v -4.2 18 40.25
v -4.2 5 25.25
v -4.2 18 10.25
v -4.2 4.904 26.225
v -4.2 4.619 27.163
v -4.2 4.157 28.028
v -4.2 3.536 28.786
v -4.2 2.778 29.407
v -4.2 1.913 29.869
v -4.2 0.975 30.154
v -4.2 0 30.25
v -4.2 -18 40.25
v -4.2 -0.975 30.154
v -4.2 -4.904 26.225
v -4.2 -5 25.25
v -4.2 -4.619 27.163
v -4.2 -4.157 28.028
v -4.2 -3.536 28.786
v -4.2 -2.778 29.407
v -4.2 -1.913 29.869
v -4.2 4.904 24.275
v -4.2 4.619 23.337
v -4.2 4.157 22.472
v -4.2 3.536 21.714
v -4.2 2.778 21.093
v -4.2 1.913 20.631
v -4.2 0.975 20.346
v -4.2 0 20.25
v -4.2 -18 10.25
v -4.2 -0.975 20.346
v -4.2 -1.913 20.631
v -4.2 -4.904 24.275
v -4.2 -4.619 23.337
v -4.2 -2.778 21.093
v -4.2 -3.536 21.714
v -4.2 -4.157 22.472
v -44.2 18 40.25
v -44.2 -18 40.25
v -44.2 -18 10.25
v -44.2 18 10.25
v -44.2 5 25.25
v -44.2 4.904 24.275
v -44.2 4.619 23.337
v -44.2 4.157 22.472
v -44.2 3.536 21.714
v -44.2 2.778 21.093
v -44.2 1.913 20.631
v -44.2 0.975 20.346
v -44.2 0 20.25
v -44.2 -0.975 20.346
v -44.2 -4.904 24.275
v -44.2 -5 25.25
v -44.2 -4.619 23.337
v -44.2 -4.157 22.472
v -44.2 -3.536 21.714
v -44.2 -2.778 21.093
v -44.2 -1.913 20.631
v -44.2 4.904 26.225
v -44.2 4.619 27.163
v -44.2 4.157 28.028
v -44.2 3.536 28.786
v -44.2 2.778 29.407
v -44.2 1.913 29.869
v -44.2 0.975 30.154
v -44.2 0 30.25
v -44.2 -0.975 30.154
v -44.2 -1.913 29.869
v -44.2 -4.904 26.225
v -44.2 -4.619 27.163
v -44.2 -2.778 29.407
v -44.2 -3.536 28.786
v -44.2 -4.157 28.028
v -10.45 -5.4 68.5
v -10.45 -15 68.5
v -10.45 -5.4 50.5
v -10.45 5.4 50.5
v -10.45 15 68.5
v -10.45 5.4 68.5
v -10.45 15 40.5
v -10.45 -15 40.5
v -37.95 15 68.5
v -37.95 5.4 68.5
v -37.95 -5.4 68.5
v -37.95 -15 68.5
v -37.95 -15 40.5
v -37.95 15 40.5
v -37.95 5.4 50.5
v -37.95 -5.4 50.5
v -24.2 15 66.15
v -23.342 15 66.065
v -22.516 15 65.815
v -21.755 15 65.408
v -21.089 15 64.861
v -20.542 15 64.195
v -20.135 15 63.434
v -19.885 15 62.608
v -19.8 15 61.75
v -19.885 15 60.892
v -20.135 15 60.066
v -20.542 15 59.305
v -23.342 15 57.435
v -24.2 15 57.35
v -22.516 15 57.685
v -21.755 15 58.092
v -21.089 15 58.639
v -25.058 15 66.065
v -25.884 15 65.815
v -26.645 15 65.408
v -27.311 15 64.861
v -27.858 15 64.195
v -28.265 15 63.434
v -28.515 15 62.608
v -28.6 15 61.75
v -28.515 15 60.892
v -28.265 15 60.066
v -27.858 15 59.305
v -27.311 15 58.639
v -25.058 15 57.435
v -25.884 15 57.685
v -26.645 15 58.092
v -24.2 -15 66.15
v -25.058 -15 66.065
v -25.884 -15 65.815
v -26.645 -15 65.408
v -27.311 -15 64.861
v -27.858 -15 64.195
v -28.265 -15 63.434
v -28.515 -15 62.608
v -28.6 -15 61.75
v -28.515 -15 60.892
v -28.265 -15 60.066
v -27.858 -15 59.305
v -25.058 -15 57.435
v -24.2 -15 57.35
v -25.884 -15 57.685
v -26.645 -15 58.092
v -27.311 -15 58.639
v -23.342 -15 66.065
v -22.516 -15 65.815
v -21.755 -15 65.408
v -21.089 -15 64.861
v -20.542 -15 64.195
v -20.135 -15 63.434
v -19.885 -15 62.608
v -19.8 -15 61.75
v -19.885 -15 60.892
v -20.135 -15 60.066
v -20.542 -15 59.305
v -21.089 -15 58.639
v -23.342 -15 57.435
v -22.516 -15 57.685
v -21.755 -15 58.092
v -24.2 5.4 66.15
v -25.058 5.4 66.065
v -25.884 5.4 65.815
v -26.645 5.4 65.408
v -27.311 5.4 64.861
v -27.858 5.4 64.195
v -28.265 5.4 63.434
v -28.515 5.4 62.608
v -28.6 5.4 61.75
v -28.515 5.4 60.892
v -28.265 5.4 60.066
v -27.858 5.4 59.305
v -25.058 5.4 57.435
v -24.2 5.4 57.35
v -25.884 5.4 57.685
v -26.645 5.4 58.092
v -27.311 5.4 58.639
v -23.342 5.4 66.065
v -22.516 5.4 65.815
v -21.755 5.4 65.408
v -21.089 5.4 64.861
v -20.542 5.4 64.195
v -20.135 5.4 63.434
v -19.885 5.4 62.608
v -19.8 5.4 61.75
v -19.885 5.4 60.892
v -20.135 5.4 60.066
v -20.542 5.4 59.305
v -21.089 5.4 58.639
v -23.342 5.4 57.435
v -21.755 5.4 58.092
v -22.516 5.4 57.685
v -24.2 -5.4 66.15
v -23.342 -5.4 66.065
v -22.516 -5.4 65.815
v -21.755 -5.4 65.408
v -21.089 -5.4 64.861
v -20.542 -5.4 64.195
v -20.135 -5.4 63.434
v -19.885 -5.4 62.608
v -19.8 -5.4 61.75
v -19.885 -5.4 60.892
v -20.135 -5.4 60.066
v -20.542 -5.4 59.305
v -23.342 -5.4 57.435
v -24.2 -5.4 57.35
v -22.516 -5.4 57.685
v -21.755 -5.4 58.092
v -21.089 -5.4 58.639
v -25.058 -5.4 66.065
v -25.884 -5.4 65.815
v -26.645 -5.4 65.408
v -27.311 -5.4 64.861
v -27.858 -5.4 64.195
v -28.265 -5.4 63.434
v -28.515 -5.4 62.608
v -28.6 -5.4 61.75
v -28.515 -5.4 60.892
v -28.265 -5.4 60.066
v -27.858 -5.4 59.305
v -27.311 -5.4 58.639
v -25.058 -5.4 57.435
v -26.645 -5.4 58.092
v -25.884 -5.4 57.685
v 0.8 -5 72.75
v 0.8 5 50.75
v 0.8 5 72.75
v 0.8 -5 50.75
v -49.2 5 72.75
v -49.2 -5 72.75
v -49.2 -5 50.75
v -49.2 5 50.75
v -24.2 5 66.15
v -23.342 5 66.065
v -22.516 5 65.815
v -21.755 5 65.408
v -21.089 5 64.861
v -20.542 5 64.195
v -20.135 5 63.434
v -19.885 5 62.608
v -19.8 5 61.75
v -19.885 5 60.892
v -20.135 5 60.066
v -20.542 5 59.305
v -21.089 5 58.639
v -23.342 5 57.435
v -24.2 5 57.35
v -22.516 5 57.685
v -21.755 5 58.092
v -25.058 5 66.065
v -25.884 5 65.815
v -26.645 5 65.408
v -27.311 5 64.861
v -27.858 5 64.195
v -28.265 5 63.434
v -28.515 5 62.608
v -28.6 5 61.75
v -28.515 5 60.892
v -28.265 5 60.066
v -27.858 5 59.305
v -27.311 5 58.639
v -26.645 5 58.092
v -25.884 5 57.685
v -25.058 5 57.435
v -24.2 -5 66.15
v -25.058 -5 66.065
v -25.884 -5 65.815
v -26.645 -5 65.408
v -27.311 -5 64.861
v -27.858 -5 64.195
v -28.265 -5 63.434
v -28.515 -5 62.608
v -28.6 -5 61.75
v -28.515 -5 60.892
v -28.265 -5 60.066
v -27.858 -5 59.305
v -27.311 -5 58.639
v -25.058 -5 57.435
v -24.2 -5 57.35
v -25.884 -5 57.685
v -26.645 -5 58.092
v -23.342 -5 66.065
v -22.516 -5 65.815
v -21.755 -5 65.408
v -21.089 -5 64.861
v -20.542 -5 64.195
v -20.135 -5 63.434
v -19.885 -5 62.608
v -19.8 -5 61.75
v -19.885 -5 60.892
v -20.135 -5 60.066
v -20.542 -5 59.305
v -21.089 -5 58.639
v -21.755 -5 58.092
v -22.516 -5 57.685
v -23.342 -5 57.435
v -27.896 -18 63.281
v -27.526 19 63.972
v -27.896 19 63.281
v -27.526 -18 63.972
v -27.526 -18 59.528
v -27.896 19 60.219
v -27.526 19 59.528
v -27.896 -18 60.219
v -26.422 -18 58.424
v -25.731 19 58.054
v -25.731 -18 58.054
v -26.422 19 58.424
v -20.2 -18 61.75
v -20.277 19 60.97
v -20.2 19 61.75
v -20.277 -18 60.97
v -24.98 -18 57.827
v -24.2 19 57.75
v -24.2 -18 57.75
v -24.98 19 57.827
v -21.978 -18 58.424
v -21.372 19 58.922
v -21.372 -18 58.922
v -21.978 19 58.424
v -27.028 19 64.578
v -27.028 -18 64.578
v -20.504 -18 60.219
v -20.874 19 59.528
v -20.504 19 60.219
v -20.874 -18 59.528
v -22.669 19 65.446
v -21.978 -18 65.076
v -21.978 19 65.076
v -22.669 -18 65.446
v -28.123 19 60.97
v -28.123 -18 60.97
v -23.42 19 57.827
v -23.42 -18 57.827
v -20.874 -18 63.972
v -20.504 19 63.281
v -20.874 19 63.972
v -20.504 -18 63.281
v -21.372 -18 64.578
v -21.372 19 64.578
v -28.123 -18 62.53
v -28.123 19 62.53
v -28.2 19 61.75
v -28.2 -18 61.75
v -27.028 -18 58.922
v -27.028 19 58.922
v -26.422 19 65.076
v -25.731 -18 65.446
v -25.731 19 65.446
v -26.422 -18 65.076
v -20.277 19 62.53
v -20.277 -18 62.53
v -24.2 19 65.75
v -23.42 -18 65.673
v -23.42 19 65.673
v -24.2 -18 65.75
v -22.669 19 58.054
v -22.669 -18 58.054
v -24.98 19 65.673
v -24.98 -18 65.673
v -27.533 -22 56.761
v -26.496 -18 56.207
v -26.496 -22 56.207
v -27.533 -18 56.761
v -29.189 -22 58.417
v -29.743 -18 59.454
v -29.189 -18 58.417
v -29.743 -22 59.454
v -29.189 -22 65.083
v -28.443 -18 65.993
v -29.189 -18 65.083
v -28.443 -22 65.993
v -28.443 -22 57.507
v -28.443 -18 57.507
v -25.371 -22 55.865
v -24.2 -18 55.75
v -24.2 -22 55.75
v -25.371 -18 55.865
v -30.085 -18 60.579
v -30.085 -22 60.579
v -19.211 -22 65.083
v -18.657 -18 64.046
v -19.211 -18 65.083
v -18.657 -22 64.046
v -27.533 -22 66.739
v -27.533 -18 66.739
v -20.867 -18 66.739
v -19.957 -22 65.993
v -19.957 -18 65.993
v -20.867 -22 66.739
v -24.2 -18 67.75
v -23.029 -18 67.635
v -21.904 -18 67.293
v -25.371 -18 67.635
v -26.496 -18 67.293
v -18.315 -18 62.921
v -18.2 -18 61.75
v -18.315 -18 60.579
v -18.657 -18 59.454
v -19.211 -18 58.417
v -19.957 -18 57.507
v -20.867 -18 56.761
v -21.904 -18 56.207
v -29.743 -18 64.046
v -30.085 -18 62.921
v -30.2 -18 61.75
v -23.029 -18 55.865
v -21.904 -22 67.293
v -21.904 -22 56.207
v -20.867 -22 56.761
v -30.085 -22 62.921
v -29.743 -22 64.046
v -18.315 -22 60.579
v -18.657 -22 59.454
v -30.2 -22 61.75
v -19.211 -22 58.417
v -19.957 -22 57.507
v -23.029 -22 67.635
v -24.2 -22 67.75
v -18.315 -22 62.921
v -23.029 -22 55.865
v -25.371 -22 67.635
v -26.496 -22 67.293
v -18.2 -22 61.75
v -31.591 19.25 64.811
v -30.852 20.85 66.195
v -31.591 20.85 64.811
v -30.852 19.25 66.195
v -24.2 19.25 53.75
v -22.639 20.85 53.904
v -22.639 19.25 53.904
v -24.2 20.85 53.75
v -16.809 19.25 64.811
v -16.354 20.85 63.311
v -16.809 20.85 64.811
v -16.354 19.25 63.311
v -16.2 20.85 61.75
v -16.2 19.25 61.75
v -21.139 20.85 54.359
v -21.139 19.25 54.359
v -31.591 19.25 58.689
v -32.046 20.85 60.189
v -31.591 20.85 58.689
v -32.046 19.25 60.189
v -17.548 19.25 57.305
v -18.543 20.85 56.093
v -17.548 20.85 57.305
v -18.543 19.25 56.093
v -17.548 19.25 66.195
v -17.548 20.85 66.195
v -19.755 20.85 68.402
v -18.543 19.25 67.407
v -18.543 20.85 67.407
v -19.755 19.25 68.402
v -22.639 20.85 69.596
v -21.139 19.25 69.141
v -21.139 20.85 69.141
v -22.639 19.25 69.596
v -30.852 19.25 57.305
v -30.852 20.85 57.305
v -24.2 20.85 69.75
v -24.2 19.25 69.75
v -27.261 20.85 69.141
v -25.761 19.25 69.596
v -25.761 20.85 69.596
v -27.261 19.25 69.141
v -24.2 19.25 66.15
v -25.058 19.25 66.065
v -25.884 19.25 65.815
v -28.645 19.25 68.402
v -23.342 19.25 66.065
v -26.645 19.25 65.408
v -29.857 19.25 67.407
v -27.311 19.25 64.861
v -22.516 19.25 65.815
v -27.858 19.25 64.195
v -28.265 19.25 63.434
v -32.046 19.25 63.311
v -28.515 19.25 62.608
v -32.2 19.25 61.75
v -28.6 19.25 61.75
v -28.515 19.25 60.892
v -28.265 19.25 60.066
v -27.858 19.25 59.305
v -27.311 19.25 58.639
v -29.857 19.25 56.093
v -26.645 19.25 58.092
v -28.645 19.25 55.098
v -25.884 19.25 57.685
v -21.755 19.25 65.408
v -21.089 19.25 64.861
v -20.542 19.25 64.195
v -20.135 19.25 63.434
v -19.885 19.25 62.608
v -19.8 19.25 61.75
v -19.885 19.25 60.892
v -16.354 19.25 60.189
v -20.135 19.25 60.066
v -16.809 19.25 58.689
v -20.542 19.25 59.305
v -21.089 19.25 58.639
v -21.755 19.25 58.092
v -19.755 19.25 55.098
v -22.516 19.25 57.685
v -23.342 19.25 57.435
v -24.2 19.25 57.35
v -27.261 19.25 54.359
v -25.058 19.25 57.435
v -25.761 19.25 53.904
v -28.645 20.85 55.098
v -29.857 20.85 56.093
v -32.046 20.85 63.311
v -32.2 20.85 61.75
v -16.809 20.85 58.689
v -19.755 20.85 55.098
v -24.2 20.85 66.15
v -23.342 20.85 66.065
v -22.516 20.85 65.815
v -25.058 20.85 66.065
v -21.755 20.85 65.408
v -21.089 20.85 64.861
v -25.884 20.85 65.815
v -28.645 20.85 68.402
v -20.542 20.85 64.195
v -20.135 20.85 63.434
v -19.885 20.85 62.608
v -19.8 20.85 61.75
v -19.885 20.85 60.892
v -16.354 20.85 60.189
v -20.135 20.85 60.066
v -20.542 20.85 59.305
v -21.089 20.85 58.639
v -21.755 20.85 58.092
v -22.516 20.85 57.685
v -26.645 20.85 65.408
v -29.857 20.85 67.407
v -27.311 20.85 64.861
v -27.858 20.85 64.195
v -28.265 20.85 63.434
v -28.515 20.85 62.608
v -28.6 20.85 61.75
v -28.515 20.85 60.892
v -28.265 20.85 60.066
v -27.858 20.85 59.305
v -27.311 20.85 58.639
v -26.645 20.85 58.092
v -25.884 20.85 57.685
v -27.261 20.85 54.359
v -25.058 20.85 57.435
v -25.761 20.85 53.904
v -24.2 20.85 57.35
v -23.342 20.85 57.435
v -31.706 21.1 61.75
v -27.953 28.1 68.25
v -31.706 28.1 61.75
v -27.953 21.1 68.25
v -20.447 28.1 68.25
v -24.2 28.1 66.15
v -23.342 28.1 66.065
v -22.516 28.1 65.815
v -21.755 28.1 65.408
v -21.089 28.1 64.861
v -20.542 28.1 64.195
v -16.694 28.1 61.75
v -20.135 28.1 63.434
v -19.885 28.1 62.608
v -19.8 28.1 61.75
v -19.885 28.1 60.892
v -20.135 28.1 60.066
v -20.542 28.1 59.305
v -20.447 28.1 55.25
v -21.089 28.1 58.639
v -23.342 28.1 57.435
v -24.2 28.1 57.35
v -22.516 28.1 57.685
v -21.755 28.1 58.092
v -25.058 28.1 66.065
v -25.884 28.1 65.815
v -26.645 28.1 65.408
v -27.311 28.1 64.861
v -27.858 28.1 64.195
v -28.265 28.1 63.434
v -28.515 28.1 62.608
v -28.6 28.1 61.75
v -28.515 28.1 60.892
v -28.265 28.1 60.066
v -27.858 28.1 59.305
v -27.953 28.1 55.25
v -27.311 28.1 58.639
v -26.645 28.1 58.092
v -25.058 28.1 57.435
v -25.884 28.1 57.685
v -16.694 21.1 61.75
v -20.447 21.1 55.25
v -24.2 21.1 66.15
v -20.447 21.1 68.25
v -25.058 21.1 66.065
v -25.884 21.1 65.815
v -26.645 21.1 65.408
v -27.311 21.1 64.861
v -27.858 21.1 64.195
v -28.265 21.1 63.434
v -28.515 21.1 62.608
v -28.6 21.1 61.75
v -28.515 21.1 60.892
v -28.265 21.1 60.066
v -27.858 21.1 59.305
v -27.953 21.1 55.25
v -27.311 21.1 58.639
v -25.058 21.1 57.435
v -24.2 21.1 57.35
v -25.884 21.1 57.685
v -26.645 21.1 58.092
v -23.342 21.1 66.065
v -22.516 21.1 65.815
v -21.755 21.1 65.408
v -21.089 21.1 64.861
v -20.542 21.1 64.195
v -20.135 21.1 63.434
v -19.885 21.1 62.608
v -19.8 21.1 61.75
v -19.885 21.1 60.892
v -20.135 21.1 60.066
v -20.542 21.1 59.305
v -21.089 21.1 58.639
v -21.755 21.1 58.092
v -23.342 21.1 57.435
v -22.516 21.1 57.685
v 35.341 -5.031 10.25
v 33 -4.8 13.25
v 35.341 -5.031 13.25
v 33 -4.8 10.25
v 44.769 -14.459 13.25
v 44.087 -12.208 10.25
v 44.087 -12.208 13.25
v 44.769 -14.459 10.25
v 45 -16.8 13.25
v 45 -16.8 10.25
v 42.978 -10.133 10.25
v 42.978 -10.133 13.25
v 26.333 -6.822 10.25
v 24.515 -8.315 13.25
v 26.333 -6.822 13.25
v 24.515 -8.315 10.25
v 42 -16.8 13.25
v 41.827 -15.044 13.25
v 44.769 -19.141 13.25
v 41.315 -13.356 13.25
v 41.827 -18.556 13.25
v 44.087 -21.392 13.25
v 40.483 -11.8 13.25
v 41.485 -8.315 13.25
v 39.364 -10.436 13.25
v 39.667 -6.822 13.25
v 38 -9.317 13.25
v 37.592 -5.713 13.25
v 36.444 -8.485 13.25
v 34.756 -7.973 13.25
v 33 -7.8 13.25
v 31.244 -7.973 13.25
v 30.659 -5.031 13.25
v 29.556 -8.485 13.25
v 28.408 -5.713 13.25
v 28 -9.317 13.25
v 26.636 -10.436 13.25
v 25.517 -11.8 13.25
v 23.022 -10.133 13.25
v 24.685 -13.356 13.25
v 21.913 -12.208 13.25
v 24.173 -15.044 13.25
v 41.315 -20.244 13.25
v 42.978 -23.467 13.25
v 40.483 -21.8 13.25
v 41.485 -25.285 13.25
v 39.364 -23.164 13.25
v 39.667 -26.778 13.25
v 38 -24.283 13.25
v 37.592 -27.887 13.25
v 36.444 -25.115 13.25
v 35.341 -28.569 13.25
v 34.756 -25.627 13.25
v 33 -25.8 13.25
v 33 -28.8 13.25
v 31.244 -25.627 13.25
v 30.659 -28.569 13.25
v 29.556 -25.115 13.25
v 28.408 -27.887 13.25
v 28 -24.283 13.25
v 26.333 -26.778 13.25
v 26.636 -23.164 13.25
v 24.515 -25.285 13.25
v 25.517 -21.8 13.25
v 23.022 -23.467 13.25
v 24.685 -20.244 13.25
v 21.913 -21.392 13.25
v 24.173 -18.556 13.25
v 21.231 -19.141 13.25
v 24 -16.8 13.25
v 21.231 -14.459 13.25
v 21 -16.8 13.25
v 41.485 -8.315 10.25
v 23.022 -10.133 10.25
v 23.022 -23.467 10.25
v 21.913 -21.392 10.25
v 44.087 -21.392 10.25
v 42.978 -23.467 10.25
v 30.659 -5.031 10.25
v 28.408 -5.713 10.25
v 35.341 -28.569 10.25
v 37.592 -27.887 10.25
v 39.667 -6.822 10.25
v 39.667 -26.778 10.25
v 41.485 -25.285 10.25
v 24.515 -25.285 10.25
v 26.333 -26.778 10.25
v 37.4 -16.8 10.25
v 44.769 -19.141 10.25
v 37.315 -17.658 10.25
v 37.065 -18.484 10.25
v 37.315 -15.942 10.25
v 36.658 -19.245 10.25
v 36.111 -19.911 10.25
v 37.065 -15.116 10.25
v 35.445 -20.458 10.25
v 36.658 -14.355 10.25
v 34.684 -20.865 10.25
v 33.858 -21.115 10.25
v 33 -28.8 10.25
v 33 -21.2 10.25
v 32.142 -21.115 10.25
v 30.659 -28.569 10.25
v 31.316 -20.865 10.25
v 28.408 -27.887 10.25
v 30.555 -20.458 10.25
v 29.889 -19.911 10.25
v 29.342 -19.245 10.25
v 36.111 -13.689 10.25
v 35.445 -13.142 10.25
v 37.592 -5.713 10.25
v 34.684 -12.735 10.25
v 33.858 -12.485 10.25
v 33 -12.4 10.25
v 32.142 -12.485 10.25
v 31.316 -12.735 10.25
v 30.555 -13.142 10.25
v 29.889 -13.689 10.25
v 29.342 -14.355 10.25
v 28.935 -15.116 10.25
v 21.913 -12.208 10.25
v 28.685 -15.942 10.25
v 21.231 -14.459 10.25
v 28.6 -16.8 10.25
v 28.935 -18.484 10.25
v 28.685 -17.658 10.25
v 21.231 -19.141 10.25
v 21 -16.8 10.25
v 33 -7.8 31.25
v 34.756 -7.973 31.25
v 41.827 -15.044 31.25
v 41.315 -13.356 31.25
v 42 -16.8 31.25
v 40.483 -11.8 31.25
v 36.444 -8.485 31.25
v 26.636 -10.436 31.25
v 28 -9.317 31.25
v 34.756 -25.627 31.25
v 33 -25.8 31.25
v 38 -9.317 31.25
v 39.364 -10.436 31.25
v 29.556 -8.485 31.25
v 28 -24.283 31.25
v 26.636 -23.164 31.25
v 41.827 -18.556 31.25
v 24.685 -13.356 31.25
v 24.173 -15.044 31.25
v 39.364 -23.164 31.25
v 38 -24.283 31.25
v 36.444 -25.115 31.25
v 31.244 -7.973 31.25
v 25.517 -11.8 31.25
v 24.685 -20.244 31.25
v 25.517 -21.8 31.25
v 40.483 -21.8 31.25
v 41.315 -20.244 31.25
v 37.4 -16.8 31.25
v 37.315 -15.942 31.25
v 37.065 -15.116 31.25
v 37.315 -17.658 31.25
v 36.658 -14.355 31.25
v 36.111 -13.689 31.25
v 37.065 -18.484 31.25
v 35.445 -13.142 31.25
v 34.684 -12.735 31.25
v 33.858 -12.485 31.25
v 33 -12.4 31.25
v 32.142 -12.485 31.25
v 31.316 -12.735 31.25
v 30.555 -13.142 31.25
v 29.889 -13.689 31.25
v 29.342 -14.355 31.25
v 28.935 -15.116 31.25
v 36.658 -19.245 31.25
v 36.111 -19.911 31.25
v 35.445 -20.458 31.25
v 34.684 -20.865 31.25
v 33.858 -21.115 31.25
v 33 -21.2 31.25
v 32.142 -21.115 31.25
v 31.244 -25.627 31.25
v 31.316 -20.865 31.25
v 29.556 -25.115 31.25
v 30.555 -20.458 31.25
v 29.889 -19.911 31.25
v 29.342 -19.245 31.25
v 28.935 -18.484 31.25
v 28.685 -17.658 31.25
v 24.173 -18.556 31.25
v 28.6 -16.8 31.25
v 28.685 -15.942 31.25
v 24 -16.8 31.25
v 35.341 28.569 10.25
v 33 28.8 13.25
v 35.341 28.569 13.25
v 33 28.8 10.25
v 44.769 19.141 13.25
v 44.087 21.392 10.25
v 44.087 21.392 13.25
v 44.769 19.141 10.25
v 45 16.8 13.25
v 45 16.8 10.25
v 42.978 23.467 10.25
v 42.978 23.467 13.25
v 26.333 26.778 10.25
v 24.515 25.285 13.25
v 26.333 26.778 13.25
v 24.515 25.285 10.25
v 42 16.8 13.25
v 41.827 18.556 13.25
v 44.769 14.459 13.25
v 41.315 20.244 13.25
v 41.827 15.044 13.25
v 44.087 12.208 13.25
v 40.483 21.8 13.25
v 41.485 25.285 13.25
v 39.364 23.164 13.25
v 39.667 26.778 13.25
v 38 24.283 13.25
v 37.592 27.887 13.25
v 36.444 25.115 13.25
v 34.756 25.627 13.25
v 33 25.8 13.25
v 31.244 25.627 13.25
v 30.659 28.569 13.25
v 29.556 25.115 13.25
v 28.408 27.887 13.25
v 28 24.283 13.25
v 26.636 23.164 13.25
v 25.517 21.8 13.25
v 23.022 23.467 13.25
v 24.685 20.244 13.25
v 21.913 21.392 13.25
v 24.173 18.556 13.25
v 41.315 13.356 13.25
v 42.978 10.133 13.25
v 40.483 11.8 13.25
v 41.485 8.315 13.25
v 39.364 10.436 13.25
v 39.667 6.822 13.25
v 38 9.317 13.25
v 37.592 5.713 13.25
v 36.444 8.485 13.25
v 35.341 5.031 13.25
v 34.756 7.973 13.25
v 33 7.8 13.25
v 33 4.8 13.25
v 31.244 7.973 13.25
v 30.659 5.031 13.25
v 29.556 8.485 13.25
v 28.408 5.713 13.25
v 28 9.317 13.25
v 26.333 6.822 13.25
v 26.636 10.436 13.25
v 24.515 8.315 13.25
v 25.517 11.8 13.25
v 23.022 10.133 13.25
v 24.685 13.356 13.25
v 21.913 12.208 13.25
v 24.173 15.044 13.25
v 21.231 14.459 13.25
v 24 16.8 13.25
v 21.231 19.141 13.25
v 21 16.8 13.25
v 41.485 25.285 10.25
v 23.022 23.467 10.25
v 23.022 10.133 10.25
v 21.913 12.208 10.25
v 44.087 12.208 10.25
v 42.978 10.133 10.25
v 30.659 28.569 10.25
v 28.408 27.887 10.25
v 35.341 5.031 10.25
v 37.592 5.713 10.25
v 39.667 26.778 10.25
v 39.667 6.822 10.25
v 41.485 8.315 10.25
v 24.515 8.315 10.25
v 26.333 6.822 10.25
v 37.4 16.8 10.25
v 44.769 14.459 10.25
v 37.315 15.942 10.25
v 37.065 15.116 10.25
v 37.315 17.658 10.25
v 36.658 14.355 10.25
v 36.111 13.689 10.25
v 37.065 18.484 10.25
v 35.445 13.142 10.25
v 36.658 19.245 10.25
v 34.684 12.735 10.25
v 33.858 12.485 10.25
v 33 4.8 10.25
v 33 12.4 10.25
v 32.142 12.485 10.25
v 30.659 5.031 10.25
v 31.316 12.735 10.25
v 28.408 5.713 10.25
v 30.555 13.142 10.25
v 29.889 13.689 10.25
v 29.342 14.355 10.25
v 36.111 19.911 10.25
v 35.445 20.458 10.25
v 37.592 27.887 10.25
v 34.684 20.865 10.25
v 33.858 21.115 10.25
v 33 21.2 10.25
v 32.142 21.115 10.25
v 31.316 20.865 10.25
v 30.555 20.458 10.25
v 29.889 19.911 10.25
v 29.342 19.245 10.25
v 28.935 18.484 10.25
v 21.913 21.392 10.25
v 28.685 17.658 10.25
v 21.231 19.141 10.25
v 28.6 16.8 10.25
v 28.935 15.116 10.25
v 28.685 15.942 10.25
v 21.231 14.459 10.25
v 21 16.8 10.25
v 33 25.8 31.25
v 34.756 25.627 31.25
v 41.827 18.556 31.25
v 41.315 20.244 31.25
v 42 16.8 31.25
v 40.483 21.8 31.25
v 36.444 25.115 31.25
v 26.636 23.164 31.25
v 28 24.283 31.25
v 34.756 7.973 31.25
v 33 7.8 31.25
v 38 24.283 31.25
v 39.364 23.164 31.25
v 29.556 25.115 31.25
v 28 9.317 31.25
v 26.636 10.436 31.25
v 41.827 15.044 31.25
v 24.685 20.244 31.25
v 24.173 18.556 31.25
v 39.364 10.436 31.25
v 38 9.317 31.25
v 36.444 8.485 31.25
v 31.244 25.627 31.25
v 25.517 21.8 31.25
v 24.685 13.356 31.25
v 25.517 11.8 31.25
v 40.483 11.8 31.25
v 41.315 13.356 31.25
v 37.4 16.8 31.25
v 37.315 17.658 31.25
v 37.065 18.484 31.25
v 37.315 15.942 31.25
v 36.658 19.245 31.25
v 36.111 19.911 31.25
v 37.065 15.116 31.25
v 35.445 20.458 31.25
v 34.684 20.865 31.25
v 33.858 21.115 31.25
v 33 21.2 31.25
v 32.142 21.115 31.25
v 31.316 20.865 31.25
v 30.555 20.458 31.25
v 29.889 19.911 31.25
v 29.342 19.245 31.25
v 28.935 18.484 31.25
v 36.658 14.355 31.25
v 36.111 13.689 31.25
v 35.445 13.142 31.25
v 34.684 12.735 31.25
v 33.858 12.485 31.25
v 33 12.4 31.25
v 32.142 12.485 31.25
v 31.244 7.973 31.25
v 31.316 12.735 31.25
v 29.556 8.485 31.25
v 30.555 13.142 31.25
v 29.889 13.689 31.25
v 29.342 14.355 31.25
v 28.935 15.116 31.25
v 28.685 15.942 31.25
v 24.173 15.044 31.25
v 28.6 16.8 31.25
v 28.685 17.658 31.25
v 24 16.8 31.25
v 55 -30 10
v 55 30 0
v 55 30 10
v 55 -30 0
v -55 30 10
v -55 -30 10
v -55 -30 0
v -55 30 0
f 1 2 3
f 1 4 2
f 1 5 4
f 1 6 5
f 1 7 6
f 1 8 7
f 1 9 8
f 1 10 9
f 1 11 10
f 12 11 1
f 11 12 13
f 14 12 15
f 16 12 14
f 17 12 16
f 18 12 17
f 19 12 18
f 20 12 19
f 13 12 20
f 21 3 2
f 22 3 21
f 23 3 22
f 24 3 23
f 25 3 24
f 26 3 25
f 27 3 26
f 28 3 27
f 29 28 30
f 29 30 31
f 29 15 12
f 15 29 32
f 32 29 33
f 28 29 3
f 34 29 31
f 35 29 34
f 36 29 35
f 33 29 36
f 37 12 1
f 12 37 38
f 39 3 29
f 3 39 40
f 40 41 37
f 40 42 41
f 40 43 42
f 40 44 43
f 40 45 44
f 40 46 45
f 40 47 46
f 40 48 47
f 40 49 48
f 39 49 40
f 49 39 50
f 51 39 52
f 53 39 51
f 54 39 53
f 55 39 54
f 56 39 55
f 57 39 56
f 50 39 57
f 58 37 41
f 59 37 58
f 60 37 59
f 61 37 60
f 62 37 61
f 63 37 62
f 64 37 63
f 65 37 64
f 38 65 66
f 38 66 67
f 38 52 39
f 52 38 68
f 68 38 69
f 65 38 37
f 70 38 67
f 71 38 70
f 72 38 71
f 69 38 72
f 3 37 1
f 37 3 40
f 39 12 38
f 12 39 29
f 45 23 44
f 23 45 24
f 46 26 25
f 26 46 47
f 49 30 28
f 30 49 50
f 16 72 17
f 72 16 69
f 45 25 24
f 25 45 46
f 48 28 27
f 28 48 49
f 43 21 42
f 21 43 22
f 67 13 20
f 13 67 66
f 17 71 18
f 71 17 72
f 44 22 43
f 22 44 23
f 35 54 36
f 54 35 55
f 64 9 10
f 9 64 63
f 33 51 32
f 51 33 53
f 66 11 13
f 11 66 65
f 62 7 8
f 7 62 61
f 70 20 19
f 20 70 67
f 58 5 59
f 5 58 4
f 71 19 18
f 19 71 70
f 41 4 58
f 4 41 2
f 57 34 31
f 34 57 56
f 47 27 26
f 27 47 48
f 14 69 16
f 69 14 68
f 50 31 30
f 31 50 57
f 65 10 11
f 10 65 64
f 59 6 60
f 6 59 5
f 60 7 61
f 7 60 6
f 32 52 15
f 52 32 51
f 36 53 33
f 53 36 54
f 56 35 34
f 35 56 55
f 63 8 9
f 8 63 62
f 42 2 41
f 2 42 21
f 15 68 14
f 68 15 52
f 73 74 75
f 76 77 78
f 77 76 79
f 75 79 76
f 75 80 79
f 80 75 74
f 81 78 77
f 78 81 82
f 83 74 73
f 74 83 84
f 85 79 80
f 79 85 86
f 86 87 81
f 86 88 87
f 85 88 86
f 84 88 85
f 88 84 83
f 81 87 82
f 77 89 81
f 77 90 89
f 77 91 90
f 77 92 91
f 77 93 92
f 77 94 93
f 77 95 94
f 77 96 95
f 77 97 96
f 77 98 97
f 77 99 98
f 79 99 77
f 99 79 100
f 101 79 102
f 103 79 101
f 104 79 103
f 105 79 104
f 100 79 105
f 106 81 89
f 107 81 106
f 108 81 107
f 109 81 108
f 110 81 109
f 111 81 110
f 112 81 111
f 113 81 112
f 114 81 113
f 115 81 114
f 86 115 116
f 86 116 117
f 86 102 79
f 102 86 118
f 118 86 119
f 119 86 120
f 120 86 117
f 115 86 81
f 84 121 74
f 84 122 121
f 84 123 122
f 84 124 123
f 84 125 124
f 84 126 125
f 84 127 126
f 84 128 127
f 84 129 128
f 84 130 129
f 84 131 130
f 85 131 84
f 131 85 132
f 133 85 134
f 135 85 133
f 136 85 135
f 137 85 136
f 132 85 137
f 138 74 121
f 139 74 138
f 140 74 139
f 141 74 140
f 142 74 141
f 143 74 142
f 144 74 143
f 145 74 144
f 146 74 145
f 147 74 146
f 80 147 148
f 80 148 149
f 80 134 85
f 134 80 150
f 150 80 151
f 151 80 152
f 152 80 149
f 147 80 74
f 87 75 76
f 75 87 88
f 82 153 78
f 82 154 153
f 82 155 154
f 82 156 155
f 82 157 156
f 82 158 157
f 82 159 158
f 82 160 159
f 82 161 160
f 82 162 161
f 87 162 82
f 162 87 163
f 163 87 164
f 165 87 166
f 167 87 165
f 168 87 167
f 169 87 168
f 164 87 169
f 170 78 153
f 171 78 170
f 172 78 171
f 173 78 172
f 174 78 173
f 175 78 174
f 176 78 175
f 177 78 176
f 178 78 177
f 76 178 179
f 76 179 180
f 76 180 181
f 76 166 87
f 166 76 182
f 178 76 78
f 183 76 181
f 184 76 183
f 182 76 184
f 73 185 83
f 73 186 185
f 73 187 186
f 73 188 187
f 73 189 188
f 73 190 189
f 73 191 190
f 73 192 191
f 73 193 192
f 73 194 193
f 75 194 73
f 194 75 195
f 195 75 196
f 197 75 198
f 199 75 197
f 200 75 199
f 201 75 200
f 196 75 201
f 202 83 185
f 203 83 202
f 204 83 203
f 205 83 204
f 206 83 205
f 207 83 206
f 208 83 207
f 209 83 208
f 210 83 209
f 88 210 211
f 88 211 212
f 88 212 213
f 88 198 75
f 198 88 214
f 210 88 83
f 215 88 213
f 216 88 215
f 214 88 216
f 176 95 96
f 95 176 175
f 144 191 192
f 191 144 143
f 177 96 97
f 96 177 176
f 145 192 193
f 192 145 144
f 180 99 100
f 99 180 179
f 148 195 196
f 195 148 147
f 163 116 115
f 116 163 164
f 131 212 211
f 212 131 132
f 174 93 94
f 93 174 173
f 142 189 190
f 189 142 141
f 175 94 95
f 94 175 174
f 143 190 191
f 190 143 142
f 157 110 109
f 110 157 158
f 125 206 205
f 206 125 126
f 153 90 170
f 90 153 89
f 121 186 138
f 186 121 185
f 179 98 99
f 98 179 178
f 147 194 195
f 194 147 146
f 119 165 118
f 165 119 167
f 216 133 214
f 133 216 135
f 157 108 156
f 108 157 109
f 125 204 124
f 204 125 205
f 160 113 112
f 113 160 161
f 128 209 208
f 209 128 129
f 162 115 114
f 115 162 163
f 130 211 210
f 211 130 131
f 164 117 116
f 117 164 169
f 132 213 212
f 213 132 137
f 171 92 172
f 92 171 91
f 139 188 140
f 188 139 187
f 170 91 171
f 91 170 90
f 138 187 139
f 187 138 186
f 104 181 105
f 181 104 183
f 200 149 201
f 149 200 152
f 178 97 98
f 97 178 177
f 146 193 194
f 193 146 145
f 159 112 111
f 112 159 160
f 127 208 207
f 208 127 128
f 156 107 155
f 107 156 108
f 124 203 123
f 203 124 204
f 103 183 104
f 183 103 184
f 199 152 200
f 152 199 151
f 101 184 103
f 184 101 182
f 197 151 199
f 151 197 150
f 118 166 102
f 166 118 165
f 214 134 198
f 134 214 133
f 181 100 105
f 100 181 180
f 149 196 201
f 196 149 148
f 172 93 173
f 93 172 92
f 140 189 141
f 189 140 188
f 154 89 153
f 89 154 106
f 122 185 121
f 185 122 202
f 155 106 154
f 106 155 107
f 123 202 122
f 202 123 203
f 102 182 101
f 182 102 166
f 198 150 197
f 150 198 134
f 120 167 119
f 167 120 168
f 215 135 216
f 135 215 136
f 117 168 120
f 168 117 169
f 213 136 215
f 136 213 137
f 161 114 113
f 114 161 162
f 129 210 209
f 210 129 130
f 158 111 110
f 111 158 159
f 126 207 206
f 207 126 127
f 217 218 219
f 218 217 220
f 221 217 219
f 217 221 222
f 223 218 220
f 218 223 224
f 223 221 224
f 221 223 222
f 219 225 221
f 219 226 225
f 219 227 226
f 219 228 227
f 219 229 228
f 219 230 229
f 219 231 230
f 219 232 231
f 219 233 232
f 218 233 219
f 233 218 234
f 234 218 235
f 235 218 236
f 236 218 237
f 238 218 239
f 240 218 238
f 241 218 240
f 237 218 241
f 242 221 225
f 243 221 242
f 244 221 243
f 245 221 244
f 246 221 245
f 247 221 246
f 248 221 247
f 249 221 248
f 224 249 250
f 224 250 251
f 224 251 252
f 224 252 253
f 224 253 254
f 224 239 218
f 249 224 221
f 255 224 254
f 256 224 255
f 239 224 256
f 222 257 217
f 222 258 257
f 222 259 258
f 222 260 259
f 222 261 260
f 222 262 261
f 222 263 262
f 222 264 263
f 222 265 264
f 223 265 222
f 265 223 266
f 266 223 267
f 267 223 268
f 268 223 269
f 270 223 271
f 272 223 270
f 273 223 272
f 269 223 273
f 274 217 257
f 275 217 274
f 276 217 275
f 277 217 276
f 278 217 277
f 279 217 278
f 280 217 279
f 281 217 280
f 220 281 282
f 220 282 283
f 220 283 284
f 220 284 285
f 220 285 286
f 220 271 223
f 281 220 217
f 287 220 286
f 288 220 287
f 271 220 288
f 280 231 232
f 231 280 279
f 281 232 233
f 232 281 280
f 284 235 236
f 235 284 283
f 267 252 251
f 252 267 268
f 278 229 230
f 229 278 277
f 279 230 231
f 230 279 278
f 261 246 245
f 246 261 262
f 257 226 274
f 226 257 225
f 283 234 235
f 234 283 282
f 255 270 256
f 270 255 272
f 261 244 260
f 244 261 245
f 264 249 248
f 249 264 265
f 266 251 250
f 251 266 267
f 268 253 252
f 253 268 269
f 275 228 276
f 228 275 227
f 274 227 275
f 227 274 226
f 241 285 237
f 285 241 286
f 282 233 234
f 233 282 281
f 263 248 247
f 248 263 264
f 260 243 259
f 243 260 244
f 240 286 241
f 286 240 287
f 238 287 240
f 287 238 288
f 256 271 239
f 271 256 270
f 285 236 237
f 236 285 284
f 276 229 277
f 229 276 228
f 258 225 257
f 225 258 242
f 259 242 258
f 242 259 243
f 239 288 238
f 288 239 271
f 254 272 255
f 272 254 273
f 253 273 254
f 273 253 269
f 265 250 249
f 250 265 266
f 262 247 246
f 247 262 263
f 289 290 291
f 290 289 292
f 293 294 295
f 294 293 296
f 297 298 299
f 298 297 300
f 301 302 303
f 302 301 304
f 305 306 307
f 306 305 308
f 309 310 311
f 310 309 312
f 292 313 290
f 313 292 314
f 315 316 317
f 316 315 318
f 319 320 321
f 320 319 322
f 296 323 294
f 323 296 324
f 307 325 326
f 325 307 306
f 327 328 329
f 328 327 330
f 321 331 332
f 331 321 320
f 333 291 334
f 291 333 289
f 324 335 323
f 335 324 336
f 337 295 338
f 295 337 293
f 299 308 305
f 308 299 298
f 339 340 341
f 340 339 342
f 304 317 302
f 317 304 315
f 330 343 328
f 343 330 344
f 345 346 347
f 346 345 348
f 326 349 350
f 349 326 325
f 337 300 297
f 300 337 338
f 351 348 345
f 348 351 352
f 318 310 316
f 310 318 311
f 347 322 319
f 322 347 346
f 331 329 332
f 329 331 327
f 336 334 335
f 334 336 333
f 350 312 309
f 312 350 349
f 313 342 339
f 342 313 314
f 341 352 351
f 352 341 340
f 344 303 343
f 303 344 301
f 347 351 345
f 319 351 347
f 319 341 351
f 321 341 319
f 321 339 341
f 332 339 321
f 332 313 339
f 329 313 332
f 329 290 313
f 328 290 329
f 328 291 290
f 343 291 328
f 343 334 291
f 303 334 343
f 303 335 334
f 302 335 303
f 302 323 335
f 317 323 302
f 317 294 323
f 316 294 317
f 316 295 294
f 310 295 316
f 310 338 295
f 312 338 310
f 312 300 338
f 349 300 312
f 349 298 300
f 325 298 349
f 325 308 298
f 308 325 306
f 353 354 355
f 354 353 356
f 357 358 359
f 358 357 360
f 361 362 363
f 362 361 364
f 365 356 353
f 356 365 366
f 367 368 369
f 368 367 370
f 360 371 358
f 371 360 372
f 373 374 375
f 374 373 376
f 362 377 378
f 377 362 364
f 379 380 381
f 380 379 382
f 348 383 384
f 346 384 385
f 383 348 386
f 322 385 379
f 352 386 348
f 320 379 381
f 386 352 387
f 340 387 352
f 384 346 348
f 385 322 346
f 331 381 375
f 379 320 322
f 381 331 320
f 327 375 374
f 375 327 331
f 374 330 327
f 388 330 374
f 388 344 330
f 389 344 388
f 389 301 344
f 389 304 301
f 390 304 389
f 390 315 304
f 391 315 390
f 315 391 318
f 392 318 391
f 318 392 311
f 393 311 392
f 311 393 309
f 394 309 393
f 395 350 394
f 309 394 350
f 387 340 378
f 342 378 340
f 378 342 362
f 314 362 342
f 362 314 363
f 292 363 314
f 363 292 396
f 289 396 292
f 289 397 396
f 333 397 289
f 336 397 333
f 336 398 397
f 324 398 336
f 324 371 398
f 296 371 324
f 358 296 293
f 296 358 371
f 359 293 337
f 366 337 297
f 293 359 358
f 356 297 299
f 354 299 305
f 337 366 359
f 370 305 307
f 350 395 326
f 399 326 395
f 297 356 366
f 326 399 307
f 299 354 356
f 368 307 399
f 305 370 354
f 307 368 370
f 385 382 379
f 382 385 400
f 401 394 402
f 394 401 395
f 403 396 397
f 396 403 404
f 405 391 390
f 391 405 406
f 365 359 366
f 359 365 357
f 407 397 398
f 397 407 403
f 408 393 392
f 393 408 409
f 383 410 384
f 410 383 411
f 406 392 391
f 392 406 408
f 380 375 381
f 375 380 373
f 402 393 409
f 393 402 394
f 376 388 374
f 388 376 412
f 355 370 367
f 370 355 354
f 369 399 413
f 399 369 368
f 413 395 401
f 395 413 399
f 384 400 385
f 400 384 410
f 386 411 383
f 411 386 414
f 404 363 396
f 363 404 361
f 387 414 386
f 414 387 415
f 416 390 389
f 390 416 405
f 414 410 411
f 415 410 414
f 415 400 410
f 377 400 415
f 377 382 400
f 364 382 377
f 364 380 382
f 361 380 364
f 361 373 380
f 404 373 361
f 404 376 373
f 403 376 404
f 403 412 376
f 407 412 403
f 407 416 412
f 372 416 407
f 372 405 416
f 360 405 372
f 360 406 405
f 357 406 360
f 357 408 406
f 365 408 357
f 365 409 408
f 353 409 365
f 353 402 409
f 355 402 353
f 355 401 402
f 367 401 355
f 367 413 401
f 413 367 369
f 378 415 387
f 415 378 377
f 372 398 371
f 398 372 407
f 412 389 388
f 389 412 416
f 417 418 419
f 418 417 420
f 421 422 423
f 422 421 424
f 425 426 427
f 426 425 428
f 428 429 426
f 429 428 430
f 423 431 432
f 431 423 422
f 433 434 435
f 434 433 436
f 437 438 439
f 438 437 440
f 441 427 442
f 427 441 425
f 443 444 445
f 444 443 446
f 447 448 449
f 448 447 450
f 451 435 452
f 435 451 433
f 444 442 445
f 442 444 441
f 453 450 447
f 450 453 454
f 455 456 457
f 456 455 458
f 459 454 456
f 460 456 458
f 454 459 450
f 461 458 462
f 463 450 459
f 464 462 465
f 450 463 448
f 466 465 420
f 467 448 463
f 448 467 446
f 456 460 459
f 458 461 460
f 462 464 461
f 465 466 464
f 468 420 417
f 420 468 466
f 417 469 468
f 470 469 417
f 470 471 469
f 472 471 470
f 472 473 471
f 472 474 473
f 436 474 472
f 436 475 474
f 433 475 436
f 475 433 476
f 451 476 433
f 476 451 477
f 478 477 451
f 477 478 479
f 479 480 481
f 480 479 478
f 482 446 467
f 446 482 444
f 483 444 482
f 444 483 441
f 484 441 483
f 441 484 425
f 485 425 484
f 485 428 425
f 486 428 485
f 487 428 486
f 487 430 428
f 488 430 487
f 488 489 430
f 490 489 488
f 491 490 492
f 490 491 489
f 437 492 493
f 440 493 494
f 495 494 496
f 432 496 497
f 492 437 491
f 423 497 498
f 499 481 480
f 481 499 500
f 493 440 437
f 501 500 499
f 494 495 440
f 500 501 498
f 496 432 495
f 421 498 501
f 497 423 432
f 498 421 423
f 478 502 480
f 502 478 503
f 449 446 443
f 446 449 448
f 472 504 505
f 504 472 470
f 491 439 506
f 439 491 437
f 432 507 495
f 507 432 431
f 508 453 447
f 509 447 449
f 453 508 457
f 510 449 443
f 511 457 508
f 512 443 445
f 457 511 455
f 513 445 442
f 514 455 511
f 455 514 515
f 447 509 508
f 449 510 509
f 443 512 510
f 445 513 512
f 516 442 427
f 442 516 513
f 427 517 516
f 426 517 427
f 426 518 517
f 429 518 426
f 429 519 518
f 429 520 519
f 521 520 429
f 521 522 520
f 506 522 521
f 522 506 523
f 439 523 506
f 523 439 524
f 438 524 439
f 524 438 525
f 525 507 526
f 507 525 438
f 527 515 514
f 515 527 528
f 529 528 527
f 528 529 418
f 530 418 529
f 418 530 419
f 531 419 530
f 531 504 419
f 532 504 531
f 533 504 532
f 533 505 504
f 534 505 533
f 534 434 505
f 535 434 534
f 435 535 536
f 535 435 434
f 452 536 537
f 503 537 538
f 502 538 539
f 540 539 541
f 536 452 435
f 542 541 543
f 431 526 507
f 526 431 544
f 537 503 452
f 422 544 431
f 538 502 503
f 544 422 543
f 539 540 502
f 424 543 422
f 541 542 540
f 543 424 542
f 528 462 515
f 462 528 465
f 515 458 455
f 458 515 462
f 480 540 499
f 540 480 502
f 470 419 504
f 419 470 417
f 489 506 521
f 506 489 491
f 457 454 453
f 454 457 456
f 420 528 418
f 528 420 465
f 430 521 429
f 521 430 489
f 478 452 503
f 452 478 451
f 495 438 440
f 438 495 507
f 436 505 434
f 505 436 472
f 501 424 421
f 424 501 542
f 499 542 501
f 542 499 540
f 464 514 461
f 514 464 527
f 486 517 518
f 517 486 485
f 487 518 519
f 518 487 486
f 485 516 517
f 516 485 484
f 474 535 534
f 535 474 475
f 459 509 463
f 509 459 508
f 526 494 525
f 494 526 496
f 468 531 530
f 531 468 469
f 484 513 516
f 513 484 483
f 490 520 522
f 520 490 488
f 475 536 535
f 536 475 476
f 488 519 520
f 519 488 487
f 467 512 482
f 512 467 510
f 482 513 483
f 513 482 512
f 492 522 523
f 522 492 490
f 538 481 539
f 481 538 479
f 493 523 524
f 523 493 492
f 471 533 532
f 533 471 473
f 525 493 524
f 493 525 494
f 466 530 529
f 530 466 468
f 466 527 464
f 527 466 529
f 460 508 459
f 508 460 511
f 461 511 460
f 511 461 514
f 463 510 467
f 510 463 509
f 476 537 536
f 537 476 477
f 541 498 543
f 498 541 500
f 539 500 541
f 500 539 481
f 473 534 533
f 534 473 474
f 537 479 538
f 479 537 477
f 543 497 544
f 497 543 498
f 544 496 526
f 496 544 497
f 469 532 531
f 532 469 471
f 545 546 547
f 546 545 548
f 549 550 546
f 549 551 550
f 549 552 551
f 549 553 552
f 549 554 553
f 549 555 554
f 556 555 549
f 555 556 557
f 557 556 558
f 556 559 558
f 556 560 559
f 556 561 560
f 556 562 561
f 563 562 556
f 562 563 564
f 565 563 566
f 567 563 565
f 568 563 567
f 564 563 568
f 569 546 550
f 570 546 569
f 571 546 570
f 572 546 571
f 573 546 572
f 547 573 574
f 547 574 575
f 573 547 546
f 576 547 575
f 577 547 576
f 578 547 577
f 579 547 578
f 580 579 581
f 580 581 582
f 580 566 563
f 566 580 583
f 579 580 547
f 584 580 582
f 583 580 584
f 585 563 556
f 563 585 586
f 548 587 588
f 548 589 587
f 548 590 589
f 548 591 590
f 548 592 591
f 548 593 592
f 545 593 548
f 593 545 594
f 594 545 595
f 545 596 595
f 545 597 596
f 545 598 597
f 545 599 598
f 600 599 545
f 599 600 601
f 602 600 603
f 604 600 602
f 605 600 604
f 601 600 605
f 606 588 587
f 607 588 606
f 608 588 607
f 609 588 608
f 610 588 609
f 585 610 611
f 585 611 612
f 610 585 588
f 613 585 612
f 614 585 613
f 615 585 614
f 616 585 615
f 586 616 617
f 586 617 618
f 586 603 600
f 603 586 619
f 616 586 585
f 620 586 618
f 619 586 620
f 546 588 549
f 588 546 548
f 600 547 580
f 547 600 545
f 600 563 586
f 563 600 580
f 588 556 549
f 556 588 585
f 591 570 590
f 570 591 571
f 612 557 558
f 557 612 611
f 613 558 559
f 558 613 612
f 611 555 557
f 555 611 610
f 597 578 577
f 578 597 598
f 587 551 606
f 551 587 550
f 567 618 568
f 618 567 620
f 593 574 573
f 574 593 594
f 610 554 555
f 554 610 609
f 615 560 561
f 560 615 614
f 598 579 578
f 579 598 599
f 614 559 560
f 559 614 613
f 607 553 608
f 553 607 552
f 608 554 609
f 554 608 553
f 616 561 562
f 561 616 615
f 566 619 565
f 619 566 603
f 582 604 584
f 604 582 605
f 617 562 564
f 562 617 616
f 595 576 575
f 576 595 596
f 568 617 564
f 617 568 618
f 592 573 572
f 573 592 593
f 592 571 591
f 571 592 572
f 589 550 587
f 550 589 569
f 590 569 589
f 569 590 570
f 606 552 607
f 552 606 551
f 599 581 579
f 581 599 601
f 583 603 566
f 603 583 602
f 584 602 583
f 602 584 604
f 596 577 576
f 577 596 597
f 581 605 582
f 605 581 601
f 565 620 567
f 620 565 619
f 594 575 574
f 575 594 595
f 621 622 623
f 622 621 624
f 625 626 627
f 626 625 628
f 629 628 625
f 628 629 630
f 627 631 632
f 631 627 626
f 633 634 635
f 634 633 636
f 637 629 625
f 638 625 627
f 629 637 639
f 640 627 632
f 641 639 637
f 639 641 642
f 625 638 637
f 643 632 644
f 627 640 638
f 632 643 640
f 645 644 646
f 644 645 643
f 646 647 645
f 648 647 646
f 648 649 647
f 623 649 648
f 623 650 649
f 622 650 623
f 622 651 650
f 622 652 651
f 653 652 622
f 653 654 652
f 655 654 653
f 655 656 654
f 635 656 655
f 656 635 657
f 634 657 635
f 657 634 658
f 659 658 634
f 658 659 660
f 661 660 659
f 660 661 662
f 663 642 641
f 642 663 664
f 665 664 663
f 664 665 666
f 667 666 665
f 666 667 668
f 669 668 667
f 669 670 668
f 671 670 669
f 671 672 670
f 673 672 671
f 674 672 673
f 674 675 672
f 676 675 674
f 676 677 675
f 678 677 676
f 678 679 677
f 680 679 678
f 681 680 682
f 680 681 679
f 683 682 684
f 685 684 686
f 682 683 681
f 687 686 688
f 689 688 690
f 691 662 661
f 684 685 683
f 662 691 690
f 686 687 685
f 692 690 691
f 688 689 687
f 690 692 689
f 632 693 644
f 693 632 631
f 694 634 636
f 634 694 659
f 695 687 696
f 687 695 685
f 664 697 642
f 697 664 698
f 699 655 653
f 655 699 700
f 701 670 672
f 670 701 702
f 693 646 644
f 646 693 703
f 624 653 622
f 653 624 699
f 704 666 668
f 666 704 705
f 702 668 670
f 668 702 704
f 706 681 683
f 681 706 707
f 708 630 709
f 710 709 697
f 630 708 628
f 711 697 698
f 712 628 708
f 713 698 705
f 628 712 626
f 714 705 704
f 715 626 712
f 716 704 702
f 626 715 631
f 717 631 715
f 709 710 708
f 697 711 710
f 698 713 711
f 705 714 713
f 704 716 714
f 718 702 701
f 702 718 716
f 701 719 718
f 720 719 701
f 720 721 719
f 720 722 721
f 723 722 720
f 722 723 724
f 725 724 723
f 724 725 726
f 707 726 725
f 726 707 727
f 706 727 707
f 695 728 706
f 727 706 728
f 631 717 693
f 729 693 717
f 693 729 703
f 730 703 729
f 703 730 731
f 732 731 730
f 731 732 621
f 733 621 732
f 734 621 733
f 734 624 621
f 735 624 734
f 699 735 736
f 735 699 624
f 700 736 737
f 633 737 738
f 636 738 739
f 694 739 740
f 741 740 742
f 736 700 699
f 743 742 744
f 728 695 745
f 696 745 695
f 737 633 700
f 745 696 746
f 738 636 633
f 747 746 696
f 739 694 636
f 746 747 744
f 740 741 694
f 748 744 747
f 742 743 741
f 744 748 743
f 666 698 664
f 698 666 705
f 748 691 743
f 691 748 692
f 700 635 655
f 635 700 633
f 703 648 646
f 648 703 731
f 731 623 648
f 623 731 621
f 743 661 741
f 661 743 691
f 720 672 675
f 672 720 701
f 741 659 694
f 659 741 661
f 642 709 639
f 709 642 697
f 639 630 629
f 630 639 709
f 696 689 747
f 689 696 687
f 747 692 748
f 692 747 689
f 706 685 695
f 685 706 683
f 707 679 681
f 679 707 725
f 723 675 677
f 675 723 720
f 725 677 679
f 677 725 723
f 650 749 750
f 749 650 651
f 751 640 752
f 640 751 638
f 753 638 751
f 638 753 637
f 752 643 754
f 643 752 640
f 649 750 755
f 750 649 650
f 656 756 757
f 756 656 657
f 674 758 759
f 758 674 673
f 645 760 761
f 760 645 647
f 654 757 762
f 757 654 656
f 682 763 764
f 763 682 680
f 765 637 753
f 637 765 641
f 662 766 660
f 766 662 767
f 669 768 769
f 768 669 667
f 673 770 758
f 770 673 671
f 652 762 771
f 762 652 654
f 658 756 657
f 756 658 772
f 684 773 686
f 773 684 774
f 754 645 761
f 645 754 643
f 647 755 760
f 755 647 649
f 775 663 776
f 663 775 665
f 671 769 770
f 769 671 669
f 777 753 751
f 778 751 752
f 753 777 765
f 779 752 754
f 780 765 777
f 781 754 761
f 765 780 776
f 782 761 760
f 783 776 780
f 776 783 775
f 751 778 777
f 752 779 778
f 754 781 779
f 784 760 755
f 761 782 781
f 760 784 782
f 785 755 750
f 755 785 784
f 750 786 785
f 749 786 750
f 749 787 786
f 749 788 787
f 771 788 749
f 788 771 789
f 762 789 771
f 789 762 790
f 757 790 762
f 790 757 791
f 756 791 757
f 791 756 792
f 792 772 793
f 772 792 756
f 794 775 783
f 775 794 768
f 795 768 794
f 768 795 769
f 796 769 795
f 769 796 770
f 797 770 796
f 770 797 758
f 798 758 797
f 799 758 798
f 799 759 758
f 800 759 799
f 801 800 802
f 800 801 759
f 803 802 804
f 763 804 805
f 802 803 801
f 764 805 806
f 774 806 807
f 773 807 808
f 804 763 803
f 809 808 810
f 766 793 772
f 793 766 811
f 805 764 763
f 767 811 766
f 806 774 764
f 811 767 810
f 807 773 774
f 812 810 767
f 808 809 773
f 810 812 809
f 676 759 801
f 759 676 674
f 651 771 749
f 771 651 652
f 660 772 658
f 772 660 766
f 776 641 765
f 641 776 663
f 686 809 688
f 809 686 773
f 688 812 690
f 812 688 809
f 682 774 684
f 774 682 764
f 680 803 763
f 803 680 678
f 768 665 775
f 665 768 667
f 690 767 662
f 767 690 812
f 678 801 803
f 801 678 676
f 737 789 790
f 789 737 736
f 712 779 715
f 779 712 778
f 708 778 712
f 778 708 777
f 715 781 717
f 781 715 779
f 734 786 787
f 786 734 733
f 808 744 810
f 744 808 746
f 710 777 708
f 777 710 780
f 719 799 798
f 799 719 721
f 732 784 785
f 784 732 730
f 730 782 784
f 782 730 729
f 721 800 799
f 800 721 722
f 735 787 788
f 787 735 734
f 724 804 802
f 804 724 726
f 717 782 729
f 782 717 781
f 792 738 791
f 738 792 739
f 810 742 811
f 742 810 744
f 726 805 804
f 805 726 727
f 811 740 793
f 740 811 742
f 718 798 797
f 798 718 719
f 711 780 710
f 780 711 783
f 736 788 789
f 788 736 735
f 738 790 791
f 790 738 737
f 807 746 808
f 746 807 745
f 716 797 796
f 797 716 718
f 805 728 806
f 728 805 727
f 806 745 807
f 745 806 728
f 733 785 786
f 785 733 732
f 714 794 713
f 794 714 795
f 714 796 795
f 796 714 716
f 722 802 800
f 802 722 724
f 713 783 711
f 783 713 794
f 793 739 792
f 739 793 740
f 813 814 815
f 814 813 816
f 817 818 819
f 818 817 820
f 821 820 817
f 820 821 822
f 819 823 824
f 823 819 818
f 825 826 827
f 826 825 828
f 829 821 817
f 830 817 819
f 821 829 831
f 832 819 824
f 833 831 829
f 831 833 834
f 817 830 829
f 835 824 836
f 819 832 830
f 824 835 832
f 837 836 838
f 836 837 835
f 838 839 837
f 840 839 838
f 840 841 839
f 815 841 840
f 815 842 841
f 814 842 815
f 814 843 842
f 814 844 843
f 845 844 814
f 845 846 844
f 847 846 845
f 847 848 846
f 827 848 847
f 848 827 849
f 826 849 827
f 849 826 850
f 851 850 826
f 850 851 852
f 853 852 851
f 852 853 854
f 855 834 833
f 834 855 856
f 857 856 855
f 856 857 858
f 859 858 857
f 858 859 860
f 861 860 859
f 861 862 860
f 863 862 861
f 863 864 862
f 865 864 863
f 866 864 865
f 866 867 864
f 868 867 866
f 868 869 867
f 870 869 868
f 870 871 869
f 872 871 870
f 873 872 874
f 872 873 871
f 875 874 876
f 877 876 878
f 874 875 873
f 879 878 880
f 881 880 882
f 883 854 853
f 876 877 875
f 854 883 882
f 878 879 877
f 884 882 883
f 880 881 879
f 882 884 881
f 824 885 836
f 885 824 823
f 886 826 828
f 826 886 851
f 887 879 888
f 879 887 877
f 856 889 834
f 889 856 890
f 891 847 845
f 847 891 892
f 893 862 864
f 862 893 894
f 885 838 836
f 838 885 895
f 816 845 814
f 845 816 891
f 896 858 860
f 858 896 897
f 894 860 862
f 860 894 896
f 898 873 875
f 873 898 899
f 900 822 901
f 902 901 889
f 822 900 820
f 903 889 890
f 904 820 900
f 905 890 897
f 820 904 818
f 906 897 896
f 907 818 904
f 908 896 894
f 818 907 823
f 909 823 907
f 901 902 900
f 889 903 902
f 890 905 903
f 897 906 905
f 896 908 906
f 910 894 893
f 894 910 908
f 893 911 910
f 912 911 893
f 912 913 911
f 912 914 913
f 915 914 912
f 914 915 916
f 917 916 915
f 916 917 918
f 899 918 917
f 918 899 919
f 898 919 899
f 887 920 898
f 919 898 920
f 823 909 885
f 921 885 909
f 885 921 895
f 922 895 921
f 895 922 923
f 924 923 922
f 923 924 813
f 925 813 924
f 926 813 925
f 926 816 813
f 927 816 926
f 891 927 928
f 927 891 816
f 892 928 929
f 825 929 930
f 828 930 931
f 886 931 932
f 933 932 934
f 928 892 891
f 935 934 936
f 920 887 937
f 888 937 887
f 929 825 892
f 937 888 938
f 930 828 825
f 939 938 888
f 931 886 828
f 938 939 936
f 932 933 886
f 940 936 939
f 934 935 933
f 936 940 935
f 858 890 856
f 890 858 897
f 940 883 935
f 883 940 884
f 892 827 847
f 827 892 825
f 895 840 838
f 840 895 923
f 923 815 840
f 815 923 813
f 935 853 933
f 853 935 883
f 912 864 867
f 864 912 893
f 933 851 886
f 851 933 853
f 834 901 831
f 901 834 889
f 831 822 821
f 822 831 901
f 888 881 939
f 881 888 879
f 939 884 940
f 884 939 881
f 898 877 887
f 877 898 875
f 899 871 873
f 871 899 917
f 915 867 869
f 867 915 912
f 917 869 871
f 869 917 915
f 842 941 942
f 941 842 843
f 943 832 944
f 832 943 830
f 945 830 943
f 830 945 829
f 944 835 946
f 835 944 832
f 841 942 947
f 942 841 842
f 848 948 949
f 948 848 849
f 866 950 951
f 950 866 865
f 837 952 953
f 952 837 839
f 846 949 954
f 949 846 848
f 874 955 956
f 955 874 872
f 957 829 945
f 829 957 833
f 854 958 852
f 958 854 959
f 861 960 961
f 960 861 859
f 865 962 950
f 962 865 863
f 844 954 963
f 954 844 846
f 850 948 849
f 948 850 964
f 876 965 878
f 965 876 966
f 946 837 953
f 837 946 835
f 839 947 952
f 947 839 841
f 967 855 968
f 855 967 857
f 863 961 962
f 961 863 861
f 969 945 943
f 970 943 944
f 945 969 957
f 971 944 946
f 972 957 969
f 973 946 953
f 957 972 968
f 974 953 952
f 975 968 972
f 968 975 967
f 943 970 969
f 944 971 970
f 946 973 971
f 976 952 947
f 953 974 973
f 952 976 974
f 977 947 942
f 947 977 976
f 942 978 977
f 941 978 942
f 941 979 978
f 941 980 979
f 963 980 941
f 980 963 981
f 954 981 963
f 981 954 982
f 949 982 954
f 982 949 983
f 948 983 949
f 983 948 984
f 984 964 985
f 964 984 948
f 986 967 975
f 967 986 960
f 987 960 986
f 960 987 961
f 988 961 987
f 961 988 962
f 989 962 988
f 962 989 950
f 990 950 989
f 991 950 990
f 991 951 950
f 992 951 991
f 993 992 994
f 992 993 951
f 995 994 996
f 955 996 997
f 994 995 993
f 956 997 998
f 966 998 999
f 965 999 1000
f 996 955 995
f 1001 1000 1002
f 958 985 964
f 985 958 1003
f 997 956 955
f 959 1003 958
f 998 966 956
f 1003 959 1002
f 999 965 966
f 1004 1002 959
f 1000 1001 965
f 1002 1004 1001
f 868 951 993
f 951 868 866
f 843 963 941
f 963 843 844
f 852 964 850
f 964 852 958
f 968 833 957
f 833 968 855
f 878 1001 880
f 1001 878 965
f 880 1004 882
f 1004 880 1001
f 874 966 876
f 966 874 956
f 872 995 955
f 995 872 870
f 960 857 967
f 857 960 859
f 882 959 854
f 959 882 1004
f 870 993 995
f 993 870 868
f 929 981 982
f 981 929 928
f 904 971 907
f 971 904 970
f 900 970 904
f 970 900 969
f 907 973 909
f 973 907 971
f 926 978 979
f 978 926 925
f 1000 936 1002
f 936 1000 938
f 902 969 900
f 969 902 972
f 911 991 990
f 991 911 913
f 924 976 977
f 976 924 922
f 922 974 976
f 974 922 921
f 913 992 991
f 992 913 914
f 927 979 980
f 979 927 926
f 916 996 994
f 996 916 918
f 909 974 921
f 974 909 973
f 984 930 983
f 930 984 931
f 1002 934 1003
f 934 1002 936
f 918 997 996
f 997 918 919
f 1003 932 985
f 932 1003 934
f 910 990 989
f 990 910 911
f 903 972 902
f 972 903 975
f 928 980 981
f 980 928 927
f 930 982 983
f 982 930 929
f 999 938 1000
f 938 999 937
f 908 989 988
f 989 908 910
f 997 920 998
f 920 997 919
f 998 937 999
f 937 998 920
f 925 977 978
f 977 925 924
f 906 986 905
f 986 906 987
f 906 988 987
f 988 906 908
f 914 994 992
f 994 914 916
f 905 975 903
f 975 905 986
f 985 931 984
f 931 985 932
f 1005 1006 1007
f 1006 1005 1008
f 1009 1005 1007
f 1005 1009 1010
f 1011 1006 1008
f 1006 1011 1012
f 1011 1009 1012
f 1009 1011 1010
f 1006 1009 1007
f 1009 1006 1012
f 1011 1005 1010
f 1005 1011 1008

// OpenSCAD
$fn = 32;

// ------------------------------------------------------------------------
// Indexing jig: plate 110 x 60 mm, pin d8
// Every part is its own module, assembly() places every instance.
// ------------------------------------------------------------------------

// --- part 1 ---
module jig_plate() {
  difference() {
    translate([-55, -30, 0]) cube([110, 60, 10]);
  }
}

// --- part 2 ---
module locator_block() {
  difference() {
    translate([-20, -18, 0]) cube([40, 36, 30]);
    translate([0, 0, 15]) rotate([0, 90, 0]) cylinder(h = 42, d = 10, center = true);
  }
}

// --- part 3 ---
module index_fork() {
  difference() {
    translate([-13.75, -15, 0]) cube([27.5, 30, 28]);
    translate([-14.75, -5.4, 10]) cube([29.5, 10.8, 19]);
    translate([0, 0, 21.25]) rotate([90, 0, 0]) cylinder(h = 32, d = 8.8, center = true);
  }
}

// --- part 4 ---
module index_arm() {
  difference() {
    translate([-25, -5, 0]) cube([50, 10, 22]);
    translate([0, 0, 11]) rotate([90, 0, 0]) cylinder(h = 12, d = 8.8, center = true);
  }
}

// --- part 5 ---
module index_pin() {
  rotate([0, 90, 0]) cylinder(h = 38, d = 8, center = true);
  translate([-22, 0, 0]) rotate([0, 90, 0]) cylinder(h = 4, d = 12);
}

// --- part 6 ---
module pin_washer() {
  difference() {
      translate([0, 0, 0]) cylinder(h = 1.6, d = 16);
      translate([0, 0, -1]) cylinder(h = 3.6, d = 8.8);
    }
}

// --- part 7 ---
module lock_nut() {
  difference() {
    linear_extrude(height = 7) polygon(points = [[7.506, 0], [3.753, 6.5], [-3.753, 6.5], [-7.506, 0], [-3.753, -6.5], [3.753, -6.5]]);
    translate([0, 0, -1]) cylinder(h = 9, d = 8.8);
  }
}

// --- part 8 ---
module guide_bush_a() {
  difference() {
    union() {
      cylinder(h = 3, d = 24);
      translate([0, 0, 3]) cylinder(h = 18, d = 18);
    }
    translate([0, 0, -1]) cylinder(h = 23, d = 8.8);
  }
}

// --- part 9 ---
module guide_bush_b() {
  difference() {
    union() {
      cylinder(h = 3, d = 24);
      translate([0, 0, 3]) cylinder(h = 18, d = 18);
    }
    translate([0, 0, -1]) cylinder(h = 23, d = 8.8);
  }
}

// --- assembly ---
module assembly() {
  color([0.80, 0.24, 0.20]) translate([0, 0, 0]) rotate([0, 0, 0]) jig_plate();
  color([0.20, 0.45, 0.75]) translate([-24.2, 0, 10.25]) rotate([0, 0, 0]) locator_block();
  color([0.25, 0.62, 0.32]) translate([-24.2, 0, 40.5]) rotate([0, 0, 0]) index_fork();
  color([0.92, 0.70, 0.18]) translate([-24.2, 0, 50.75]) rotate([0, 0, 0]) index_arm();
  color([0.58, 0.35, 0.70]) translate([-24.2, 0, 61.75]) rotate([0, 0, 90]) index_pin();
  color([0.16, 0.66, 0.66]) translate([-24.2, 20.85, 61.75]) rotate([90, 0, 0]) pin_washer();
  color([0.85, 0.48, 0.18]) translate([-24.2, 28.1, 61.75]) rotate([90, 0, 0]) lock_nut();
  color([0.55, 0.60, 0.65]) translate([33, -16.8, 10.25]) rotate([0, 0, 0]) guide_bush_a();
  color([0.75, 0.30, 0.55]) translate([33, 16.8, 10.25]) rotate([0, 0, 0]) guide_bush_b();
}

assembly();
